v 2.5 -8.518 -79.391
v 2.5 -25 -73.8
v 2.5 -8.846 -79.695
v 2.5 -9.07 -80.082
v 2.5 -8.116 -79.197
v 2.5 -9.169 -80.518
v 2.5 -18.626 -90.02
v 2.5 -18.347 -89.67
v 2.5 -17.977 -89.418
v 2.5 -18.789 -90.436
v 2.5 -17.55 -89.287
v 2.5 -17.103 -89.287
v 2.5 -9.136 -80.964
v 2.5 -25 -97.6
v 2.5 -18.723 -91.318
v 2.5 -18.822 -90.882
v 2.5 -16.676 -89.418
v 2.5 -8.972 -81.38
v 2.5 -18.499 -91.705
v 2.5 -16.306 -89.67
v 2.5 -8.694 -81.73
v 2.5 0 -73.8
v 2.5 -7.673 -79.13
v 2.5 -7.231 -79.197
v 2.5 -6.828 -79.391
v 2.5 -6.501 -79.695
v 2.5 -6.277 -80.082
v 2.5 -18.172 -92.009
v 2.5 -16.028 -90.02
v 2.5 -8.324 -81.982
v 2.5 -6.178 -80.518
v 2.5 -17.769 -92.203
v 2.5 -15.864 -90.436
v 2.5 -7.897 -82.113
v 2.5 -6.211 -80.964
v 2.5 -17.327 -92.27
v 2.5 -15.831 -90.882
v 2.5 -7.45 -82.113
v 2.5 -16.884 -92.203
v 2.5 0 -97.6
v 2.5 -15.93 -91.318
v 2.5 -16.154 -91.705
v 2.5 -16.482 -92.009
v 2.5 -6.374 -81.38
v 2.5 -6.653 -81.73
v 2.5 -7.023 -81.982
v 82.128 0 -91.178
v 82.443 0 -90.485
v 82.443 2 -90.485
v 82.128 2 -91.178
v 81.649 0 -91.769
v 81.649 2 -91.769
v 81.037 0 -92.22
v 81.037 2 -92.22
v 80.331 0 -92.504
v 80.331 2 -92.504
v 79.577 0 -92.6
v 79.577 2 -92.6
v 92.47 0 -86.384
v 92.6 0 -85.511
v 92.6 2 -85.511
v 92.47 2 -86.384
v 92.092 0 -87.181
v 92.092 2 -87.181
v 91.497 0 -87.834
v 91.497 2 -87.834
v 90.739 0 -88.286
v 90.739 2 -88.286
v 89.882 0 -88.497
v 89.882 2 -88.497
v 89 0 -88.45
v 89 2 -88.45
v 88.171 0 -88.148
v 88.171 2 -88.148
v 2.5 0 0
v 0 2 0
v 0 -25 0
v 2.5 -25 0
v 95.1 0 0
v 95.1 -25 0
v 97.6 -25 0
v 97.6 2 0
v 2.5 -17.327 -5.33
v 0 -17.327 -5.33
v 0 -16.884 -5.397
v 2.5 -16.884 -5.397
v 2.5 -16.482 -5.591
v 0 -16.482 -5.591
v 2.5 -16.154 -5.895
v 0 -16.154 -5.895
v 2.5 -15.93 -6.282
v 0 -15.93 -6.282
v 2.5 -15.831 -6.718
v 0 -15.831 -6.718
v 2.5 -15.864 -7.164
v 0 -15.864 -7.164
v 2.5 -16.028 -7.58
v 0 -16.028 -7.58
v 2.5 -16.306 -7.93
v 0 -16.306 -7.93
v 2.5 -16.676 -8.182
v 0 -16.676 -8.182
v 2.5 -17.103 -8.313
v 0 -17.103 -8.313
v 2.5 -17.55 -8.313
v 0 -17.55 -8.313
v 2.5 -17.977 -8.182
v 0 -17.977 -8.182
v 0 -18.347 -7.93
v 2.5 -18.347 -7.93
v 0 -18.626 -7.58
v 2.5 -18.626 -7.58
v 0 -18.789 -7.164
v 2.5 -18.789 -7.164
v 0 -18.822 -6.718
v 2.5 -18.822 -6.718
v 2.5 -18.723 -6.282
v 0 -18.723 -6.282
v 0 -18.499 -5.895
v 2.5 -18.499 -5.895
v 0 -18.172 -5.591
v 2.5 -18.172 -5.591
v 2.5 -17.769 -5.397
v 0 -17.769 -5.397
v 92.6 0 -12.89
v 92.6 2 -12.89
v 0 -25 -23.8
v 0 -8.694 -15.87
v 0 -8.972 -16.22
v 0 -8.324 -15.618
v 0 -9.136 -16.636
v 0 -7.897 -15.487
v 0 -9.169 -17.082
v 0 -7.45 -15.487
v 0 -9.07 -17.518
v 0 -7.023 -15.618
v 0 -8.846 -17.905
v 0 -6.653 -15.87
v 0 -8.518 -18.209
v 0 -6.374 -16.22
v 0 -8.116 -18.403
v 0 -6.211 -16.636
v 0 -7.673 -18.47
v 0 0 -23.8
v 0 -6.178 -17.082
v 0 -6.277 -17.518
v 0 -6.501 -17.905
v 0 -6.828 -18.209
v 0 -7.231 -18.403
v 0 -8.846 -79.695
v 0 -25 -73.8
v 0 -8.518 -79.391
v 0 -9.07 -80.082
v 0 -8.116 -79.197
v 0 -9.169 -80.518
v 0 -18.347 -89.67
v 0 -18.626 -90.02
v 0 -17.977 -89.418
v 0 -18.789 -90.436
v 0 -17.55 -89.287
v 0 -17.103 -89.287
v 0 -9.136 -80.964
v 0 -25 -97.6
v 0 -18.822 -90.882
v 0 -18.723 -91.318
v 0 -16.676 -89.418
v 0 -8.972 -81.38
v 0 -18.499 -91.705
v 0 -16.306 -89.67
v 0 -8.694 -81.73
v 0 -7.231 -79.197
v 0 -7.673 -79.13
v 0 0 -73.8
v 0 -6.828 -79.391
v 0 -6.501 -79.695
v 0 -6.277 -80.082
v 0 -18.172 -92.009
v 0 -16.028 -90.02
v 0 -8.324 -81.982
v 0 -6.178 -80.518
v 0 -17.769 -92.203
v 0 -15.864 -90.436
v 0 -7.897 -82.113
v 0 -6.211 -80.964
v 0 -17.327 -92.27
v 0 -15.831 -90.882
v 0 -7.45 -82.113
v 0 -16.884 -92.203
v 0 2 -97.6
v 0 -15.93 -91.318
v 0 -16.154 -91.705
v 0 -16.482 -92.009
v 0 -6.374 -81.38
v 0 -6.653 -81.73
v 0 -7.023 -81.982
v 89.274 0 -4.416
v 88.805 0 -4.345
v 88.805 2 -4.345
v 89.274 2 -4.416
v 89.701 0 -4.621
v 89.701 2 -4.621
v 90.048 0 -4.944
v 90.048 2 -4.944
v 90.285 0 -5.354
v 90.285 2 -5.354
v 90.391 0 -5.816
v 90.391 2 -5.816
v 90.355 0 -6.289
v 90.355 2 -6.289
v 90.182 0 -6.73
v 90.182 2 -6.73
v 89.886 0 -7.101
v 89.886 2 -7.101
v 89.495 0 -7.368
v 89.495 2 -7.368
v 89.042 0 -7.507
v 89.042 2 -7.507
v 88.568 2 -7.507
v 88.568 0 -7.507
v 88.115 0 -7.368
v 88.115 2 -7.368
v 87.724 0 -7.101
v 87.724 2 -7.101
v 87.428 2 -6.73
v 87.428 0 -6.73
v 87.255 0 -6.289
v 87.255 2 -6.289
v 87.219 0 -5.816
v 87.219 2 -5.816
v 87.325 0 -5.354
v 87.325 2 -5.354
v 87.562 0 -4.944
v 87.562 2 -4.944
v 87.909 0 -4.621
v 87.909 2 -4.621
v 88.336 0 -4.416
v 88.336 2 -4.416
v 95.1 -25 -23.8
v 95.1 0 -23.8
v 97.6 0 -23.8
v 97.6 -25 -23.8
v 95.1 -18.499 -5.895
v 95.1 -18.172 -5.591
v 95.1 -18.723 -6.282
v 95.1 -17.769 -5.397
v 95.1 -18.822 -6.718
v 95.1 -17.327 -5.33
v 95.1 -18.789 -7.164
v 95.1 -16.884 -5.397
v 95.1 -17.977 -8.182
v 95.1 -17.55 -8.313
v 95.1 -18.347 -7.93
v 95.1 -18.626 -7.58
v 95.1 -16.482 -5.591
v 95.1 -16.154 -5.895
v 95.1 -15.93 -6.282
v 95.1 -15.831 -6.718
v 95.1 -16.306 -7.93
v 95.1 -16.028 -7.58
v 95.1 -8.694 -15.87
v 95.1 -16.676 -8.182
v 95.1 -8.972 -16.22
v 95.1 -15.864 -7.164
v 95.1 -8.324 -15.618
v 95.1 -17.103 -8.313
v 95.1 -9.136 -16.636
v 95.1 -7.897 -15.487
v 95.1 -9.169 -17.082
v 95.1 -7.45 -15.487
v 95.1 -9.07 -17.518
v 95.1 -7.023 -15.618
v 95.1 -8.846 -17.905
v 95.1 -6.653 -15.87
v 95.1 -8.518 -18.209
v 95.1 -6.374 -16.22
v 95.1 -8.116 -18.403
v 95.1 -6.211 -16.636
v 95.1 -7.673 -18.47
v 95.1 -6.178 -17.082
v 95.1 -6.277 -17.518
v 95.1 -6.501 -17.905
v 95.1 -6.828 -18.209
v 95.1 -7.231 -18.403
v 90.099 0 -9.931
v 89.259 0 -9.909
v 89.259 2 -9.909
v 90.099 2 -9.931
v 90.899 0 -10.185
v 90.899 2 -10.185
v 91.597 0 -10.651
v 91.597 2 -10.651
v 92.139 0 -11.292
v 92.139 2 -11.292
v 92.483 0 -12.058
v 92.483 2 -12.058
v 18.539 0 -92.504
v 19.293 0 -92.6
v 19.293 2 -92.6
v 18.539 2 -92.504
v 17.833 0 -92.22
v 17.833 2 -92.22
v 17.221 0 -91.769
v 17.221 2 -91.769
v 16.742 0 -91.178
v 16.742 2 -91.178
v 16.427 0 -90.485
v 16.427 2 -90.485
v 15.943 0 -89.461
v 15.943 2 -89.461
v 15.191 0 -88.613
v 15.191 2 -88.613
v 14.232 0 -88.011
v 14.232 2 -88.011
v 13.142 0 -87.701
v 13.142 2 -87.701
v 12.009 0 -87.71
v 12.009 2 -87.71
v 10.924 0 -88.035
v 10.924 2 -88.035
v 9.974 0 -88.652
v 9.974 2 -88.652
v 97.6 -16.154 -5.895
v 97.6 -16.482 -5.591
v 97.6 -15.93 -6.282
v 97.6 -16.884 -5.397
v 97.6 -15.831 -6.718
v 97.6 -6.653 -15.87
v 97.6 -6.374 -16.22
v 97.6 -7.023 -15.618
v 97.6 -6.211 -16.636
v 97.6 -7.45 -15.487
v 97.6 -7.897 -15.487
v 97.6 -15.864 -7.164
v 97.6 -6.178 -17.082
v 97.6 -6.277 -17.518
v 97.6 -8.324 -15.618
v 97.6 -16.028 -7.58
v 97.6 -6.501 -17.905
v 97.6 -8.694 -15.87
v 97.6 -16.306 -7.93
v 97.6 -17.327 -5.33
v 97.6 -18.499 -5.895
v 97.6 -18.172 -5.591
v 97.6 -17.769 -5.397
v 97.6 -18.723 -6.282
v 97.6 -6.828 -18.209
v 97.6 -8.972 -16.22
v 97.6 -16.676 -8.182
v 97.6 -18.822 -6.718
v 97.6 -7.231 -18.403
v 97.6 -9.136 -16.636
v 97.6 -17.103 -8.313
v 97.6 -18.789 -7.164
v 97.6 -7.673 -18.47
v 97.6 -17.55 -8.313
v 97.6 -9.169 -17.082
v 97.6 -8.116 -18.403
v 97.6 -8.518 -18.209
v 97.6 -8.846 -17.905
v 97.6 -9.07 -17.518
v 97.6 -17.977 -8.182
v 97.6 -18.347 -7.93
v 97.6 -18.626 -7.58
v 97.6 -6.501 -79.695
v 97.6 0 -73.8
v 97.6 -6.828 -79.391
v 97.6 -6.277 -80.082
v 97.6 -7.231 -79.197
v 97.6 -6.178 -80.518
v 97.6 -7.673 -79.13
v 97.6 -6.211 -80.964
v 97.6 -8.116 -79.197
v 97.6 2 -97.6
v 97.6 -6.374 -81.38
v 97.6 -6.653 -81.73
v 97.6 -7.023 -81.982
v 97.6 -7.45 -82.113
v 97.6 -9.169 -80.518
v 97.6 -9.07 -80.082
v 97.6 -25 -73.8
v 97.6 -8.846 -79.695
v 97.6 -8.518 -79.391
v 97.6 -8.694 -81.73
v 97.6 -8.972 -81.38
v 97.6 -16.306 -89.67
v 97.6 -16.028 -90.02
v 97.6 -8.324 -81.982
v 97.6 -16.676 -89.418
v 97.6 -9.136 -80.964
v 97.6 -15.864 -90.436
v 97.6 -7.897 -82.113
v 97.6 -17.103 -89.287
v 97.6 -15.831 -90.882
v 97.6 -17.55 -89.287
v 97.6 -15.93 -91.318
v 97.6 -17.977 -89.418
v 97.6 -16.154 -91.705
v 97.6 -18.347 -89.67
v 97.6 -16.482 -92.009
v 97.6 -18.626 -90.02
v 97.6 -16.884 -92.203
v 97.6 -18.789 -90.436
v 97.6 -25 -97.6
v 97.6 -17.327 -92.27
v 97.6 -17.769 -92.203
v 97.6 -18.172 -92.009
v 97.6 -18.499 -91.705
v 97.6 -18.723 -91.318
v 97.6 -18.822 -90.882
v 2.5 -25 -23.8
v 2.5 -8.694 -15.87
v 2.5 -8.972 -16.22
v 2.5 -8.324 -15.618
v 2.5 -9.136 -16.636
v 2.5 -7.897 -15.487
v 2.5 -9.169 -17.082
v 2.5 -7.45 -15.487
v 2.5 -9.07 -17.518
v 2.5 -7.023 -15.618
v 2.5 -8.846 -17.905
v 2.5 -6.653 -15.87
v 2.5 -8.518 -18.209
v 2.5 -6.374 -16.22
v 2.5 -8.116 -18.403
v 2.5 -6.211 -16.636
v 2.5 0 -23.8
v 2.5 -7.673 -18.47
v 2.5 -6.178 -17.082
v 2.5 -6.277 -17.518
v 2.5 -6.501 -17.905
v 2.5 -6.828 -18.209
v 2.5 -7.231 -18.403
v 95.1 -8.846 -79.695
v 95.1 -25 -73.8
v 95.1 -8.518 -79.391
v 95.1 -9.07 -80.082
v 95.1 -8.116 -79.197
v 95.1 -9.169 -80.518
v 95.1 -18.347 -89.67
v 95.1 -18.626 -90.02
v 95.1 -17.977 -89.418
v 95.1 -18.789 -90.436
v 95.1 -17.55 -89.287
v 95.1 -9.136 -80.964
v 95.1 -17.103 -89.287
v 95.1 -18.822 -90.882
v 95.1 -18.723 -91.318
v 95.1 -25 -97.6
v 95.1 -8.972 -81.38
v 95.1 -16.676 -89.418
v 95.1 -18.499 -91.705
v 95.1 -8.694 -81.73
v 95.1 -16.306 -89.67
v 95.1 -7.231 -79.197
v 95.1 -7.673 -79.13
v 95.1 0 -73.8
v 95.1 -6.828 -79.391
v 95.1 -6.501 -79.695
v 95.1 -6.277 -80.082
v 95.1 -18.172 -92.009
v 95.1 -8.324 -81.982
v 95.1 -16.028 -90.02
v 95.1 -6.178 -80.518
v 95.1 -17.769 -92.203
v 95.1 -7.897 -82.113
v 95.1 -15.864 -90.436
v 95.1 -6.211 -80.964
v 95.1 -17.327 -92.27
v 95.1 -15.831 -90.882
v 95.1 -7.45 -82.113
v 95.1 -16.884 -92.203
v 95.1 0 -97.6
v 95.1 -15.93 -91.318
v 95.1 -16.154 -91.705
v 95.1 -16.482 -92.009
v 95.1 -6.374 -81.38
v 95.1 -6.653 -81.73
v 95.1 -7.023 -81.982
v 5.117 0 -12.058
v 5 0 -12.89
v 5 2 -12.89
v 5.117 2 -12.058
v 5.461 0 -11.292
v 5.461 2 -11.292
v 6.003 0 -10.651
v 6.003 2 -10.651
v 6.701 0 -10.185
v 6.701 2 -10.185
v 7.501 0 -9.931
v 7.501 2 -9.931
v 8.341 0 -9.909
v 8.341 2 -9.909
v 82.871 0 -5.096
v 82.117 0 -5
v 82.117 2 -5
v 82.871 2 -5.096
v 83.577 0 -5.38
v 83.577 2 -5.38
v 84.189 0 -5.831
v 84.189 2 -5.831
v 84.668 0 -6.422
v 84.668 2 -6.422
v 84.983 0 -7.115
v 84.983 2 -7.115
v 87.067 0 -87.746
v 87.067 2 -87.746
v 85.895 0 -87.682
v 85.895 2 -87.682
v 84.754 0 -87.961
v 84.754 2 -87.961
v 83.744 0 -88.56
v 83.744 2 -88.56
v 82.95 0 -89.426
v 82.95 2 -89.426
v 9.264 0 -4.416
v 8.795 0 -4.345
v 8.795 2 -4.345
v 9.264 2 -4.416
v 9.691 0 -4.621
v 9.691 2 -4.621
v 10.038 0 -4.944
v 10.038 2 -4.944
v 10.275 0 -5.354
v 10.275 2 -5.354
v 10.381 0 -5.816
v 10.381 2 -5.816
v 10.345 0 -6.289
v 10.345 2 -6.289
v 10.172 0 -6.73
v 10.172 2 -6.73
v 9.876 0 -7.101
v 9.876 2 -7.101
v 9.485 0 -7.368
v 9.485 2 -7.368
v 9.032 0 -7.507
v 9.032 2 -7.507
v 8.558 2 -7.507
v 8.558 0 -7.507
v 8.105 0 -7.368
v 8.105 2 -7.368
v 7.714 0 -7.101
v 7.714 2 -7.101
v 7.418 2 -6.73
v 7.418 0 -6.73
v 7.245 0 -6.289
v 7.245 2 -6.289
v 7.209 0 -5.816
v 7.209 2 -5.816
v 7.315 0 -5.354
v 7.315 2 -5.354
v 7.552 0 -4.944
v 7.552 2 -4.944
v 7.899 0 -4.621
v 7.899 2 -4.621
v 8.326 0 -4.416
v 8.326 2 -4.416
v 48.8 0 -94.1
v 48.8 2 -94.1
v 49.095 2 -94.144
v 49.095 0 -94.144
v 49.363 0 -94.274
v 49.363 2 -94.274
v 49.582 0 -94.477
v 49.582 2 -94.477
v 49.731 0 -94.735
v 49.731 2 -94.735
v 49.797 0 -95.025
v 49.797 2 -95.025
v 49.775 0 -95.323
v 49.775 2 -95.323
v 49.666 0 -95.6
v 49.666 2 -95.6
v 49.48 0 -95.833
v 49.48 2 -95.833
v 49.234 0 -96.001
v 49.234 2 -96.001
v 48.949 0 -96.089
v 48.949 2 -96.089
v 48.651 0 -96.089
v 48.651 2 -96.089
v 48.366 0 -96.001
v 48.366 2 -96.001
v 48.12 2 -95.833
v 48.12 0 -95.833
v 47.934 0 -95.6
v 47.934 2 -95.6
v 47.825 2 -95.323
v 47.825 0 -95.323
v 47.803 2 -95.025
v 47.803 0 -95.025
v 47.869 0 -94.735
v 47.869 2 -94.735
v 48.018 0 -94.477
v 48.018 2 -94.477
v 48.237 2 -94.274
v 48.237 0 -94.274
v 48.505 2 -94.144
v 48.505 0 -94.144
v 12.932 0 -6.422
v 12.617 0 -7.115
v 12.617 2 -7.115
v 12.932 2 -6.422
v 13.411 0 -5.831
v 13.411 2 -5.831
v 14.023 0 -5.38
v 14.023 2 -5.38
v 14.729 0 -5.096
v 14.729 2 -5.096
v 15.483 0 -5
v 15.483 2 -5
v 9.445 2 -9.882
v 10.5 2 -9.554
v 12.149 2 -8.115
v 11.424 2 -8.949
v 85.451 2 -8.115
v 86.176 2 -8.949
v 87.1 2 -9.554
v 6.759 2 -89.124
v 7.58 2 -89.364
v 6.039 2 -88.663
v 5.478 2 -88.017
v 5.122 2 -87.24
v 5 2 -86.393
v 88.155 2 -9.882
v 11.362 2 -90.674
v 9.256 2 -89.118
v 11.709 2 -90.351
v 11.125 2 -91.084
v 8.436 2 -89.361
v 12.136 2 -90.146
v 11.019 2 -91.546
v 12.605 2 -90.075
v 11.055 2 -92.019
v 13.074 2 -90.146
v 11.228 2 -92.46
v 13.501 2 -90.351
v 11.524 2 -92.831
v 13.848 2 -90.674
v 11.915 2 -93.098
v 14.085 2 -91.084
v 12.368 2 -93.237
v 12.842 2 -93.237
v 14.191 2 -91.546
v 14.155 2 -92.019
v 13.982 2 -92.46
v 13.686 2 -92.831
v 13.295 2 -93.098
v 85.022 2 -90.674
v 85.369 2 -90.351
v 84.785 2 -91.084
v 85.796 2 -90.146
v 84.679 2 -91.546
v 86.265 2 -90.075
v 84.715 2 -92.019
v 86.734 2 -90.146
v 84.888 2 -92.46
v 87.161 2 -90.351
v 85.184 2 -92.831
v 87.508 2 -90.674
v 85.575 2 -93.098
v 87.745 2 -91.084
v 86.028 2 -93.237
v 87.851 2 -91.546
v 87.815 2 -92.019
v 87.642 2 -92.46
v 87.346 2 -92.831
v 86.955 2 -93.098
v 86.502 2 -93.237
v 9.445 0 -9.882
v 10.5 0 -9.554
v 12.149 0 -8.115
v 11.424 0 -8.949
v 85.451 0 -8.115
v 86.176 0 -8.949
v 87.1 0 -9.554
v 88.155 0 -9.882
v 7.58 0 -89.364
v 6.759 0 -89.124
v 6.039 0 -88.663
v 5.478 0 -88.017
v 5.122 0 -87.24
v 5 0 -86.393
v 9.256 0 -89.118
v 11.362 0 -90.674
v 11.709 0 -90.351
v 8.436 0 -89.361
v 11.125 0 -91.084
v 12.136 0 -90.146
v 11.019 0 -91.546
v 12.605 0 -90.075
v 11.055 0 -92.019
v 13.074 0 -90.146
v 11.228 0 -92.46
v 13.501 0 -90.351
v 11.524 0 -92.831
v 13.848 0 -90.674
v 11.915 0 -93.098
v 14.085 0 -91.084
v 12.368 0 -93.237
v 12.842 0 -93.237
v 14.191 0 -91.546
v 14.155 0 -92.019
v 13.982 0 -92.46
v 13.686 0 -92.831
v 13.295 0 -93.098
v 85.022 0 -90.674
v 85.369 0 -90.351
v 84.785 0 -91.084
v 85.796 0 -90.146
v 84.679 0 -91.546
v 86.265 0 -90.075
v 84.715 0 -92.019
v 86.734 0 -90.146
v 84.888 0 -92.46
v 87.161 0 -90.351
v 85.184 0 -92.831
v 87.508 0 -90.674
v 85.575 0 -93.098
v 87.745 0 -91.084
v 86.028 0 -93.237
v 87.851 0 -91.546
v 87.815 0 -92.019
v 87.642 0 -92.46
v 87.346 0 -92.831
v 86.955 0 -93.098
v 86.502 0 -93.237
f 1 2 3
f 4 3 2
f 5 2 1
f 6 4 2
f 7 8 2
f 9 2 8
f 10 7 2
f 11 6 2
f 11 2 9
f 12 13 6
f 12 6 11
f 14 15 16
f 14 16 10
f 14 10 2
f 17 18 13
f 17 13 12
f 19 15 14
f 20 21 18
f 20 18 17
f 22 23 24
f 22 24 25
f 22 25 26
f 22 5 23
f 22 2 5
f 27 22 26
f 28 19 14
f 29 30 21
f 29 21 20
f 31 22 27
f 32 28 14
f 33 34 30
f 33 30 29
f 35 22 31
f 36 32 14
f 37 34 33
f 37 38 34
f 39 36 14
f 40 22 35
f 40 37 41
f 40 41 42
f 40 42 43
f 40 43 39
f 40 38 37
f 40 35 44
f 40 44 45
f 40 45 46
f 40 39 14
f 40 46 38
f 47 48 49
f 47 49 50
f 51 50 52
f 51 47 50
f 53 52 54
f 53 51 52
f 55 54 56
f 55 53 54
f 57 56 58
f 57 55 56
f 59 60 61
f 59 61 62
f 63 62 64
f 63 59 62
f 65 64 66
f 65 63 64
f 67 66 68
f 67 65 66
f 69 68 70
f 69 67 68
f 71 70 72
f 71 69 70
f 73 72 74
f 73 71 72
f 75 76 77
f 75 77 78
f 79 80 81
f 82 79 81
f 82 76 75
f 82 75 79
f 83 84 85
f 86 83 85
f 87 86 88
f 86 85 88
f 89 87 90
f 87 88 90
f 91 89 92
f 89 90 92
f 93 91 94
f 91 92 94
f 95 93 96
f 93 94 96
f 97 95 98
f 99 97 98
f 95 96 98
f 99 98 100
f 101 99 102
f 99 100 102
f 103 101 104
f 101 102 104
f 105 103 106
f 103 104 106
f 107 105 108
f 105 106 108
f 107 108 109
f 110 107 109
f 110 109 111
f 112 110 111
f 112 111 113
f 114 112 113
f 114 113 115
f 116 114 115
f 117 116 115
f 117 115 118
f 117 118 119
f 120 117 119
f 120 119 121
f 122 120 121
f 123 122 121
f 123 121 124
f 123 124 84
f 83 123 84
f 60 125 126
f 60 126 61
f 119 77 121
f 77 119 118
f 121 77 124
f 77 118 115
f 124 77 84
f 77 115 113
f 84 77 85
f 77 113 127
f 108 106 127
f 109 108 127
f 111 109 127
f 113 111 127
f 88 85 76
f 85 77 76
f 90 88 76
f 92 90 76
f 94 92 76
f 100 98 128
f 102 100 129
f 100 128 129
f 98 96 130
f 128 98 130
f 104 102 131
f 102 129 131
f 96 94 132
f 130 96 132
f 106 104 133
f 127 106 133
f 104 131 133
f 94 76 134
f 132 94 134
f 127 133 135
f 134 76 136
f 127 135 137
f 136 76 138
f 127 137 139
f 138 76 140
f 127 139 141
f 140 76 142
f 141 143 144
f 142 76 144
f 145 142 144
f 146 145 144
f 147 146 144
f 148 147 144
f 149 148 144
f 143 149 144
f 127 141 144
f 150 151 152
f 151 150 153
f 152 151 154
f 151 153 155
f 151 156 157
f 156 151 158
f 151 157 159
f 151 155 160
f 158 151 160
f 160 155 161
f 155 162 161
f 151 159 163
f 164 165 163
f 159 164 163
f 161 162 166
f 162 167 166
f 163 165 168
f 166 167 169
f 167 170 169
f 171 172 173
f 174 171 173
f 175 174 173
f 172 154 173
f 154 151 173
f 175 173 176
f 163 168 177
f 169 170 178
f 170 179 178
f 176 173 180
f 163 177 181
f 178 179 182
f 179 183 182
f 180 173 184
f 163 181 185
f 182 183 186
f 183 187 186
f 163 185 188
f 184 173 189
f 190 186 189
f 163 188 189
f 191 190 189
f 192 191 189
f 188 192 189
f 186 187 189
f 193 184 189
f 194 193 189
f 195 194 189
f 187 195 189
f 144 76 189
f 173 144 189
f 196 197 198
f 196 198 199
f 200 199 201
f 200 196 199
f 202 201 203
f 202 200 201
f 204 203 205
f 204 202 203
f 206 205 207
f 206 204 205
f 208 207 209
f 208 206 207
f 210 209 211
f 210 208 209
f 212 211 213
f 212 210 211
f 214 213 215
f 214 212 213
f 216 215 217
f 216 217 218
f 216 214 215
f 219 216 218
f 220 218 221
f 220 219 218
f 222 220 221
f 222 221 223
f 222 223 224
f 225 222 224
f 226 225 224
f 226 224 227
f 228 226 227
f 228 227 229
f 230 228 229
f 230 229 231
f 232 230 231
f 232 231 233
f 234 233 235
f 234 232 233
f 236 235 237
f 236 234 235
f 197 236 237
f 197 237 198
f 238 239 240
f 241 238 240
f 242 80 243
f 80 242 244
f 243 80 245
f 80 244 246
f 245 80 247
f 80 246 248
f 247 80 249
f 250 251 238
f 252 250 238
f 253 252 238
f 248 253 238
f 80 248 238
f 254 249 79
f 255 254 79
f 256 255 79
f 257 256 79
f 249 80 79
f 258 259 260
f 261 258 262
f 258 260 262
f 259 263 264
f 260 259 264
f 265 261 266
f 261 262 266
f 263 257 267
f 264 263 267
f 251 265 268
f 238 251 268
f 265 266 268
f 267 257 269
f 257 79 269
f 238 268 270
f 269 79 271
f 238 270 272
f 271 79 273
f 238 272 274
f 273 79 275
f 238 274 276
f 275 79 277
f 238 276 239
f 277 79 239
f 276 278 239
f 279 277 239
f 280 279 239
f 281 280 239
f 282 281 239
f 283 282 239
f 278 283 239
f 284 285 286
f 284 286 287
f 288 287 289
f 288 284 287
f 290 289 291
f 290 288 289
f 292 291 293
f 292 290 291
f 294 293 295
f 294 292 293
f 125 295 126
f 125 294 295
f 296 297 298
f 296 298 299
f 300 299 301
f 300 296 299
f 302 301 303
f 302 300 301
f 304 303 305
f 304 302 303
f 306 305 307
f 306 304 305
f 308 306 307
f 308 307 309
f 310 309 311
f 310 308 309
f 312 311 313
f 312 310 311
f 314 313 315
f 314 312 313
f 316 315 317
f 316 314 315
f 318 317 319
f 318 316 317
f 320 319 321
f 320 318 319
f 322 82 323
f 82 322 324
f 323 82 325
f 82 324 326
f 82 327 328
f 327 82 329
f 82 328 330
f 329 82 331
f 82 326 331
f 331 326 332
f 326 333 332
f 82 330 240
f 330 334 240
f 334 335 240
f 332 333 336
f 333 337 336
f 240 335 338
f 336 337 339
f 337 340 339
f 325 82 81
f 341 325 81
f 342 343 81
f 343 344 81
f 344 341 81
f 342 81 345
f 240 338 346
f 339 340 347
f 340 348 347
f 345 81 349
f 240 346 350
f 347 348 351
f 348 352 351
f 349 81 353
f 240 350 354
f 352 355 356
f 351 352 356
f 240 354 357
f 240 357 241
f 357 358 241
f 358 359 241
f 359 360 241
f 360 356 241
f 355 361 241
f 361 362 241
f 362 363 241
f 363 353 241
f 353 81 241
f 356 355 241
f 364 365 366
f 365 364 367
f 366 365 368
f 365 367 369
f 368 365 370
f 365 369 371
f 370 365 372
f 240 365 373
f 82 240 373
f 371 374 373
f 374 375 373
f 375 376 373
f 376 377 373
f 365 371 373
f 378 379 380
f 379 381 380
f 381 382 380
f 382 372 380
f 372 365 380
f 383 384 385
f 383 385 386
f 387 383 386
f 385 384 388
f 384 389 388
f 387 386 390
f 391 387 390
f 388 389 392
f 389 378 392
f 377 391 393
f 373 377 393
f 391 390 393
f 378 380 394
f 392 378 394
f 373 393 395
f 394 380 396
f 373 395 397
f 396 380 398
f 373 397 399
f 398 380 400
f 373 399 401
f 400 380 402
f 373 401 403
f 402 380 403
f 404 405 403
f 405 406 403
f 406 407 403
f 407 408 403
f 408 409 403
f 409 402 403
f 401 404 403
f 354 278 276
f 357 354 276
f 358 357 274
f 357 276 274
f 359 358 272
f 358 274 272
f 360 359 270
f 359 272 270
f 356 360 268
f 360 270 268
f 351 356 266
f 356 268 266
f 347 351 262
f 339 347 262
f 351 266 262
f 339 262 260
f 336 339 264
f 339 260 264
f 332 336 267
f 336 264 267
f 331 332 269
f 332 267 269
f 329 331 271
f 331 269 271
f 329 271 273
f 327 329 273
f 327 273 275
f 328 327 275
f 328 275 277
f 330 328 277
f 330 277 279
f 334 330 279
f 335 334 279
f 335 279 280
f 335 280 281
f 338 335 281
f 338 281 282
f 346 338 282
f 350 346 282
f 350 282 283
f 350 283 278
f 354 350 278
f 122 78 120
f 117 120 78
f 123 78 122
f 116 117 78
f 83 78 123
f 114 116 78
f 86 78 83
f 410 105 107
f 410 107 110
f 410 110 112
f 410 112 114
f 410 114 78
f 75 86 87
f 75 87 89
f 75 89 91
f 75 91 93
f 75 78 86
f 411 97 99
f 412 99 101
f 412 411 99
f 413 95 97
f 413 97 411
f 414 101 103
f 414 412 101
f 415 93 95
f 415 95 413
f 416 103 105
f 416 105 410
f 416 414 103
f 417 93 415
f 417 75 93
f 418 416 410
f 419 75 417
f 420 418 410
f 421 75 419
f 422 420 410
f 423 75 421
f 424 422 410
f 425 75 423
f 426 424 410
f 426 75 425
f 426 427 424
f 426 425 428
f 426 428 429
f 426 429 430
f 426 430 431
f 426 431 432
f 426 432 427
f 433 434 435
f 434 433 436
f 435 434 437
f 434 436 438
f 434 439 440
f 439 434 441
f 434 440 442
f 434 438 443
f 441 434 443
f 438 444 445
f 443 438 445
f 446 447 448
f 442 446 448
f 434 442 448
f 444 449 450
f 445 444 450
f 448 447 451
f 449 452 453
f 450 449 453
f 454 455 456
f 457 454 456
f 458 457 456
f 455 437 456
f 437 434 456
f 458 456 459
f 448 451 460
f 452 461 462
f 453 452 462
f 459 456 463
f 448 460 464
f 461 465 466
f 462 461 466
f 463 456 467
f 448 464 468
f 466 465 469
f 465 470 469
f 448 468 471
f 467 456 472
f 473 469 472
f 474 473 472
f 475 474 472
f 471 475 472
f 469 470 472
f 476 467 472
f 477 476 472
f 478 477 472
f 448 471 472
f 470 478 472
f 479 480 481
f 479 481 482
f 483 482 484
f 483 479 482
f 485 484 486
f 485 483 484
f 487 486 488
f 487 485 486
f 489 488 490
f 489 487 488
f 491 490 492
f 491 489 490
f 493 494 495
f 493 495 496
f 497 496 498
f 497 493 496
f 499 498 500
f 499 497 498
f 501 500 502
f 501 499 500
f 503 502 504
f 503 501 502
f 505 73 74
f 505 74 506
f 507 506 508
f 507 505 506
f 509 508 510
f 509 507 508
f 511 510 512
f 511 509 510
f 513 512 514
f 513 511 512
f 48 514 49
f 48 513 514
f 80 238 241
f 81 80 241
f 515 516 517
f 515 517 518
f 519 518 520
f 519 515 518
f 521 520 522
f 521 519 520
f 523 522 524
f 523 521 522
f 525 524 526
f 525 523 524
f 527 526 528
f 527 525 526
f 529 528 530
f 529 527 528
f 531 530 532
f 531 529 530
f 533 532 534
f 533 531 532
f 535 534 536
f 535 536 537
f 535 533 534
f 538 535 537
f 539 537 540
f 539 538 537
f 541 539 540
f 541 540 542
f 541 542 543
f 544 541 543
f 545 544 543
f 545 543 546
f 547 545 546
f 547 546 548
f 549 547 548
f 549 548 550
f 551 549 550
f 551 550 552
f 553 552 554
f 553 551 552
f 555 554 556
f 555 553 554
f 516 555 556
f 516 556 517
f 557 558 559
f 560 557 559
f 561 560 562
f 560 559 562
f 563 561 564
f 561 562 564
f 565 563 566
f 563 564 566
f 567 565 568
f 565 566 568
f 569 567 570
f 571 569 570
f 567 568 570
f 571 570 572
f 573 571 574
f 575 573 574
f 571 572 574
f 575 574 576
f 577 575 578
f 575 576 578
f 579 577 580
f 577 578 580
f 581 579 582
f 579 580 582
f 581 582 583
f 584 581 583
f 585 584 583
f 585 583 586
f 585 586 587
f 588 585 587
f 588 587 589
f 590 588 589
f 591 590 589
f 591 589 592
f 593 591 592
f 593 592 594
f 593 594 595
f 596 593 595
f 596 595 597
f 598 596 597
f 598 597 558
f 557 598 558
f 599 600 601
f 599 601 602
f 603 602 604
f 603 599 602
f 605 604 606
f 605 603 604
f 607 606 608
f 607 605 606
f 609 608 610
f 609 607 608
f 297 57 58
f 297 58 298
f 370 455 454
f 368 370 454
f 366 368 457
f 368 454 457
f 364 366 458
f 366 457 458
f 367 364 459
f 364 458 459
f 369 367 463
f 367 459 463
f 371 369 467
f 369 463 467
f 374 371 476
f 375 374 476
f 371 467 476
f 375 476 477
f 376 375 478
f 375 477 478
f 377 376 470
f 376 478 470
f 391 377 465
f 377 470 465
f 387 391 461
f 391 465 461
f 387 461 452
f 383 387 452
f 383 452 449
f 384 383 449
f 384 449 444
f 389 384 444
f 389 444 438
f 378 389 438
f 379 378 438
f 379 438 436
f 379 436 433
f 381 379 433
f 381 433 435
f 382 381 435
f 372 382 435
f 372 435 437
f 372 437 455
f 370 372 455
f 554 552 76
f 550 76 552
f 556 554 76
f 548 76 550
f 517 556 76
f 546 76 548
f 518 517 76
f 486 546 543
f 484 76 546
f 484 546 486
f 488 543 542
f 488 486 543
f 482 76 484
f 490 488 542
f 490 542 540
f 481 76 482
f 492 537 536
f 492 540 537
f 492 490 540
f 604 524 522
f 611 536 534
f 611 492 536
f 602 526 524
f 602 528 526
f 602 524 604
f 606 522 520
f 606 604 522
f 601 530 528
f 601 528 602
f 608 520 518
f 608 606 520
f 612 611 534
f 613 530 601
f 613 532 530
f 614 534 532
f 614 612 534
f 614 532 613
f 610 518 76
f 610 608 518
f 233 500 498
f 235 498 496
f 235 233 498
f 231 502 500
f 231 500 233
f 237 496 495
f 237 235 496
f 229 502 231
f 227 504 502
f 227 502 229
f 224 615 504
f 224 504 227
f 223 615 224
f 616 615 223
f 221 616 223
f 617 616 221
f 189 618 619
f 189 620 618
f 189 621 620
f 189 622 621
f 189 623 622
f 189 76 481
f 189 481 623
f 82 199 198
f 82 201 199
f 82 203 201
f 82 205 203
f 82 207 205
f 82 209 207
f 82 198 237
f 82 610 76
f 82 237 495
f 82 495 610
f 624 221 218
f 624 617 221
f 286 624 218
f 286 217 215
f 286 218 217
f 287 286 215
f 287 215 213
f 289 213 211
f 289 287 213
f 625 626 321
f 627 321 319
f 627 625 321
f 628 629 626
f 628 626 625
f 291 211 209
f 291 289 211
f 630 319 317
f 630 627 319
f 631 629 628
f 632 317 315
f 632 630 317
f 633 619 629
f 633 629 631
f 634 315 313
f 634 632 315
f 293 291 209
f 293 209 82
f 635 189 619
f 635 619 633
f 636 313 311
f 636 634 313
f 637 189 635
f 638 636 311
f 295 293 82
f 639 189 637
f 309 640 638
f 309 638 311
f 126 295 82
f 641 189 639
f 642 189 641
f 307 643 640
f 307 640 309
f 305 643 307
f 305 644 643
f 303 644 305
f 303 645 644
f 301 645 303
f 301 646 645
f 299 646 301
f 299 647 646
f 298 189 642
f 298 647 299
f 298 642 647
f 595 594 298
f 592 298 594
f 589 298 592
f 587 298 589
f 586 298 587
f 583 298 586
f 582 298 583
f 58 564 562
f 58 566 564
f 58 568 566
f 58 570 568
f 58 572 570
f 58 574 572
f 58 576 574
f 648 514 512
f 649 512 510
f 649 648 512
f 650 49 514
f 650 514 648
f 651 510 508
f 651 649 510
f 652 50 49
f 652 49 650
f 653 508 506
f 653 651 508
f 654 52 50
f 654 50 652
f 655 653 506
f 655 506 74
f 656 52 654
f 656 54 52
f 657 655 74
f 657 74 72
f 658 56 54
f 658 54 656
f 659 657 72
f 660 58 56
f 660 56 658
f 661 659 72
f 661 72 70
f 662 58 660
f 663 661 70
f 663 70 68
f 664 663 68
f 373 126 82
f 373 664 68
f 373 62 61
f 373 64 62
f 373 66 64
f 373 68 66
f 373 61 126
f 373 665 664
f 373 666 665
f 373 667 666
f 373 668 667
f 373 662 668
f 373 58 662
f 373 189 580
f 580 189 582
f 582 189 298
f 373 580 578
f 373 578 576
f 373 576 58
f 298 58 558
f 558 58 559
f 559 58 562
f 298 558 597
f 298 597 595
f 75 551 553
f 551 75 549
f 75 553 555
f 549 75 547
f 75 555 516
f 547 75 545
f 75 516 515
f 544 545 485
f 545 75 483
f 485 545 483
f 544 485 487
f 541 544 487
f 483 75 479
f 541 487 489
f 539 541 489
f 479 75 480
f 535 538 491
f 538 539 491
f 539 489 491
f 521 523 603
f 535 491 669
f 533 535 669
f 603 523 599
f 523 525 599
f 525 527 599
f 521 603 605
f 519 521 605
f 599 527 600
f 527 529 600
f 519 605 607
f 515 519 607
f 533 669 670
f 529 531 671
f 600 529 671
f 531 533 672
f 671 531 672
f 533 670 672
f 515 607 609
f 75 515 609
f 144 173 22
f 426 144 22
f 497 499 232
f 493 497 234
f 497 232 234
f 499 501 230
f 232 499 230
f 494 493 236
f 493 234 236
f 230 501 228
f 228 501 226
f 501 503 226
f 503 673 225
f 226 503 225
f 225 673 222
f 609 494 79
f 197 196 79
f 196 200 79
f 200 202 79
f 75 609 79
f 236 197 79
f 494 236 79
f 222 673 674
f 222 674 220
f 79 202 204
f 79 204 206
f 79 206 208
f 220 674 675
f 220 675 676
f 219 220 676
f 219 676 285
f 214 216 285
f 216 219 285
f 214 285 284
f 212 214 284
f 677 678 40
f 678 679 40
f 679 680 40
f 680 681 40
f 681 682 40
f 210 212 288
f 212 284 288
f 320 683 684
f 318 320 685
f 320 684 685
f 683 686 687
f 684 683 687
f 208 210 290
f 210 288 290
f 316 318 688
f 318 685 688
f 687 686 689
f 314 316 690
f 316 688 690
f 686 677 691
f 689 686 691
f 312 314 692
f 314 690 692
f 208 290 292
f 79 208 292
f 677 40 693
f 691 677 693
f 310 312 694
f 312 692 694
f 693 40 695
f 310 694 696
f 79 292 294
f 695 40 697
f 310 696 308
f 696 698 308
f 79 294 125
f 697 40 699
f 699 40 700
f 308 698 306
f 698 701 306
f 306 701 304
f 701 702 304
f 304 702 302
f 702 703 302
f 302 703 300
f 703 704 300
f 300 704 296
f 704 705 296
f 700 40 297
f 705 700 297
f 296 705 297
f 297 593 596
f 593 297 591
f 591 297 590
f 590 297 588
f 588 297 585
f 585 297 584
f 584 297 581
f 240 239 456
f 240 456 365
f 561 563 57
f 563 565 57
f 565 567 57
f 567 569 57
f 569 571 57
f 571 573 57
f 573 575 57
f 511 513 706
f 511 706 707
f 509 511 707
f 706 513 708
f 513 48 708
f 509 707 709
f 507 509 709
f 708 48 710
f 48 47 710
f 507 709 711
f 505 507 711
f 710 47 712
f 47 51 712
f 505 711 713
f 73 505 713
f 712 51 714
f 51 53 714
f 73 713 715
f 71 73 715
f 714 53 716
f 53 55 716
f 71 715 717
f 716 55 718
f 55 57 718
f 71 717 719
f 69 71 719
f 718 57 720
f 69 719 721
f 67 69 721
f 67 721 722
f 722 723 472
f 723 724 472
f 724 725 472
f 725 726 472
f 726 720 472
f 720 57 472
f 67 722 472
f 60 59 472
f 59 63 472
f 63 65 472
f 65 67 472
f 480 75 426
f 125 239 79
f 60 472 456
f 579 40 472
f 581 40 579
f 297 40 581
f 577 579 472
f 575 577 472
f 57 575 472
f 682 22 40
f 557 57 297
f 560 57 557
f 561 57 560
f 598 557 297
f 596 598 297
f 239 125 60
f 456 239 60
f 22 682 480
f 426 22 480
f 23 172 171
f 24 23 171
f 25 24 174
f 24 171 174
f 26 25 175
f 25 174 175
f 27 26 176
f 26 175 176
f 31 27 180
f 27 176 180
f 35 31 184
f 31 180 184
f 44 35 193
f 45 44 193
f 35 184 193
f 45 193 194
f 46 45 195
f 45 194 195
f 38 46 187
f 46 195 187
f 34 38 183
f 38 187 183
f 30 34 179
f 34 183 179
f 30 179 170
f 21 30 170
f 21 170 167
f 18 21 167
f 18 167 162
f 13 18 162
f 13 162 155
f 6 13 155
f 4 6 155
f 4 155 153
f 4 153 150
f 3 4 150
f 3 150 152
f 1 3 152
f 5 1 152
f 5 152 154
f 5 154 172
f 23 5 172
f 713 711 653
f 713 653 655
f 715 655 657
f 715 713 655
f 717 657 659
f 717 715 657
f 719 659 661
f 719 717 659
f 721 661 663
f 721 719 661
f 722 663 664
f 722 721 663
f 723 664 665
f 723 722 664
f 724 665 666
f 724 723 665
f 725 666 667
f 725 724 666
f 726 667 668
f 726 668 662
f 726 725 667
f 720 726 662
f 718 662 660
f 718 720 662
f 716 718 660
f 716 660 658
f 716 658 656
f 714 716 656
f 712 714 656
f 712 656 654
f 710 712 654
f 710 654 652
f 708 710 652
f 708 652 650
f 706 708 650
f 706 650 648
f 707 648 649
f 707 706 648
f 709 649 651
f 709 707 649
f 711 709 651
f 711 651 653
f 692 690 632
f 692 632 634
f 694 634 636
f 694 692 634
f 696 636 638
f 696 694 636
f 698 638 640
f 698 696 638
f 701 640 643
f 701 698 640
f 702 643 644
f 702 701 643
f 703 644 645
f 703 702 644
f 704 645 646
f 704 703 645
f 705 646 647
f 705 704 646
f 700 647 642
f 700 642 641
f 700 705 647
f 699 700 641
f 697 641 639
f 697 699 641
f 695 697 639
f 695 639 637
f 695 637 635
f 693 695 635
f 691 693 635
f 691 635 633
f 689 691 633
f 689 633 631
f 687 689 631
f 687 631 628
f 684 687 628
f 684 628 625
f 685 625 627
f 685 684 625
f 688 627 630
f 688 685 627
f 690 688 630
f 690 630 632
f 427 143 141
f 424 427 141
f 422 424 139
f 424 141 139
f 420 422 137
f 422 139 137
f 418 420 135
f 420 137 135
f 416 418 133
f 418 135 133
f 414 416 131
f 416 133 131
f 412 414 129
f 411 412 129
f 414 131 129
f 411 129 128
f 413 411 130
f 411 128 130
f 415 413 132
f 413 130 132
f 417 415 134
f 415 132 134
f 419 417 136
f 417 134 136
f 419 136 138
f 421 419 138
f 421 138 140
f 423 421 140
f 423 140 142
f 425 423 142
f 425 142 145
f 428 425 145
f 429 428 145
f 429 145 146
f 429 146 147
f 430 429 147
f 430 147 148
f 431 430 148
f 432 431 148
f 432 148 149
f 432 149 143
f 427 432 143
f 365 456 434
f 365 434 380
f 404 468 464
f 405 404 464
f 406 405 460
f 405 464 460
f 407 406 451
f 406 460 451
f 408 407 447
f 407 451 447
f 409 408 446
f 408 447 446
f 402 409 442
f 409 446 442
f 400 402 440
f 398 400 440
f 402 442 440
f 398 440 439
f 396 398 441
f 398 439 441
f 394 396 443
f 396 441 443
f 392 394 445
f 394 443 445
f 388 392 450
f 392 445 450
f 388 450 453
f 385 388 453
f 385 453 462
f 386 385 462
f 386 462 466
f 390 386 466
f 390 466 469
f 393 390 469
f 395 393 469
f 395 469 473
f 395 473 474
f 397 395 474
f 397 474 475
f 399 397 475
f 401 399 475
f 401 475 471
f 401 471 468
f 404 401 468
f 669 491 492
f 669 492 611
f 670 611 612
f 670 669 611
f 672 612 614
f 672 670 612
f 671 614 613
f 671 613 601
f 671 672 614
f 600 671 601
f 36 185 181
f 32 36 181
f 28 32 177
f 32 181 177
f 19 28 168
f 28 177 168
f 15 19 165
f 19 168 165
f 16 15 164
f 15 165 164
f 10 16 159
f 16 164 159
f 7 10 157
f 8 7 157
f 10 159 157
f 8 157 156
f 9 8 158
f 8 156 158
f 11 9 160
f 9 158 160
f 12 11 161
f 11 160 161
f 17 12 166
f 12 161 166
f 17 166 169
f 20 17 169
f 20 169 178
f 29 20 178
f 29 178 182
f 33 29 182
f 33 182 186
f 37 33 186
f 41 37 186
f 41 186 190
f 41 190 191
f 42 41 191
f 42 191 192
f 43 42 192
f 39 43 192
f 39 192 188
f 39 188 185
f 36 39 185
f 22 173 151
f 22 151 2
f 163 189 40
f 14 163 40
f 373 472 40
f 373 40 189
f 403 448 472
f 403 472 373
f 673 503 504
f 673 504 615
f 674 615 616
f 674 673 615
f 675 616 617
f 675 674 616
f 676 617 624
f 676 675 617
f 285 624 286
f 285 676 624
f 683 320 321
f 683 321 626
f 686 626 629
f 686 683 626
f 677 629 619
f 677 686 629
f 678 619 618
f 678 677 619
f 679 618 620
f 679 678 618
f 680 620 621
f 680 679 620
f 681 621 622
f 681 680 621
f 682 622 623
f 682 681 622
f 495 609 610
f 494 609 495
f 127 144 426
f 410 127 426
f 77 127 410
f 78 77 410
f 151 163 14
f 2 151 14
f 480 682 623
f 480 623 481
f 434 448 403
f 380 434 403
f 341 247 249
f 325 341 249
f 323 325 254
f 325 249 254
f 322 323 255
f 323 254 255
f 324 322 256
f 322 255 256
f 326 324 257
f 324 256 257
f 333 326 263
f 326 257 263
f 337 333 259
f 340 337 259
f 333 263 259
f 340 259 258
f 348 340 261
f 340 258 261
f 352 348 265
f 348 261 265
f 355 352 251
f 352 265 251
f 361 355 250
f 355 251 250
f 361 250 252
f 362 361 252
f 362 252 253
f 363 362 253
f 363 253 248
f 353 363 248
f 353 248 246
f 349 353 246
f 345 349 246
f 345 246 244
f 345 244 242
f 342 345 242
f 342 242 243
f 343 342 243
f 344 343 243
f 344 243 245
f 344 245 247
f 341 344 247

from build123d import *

# Parameters (mm, degrees)
SKETCH_1_W          = 97.6
SKETCH_1_H          = 97.6
SKETCH_1_R          = 1.59
EXTRUDE_1_DEPTH     = 2
SKETCH_2_R          = 1
CUT_EXTRUDE_1_DEPTH = 139.04173282
EXTRUDE_START       = -2
SKETCH_7_W          = 2.5
SKETCH_7_H          = 23.8
EXTRUDE_2_DEPTH     = 25
SKETCH_8_R          = 1.5
CUT_EXTRUDE_2_DEPTH = 141.273019501


with BuildPart() as part:
    # Эскиз1 → Бобышка-Вытянуть1 (new body)
    with BuildSketch(Plane(origin=(0, 0, 0), x_dir=(1, 0, 0), z_dir=(0, 1, 0))):
        with Locations((48.8, 48.8)):
            Rectangle(SKETCH_1_W, SKETCH_1_H)
        with Locations(Location((86.265001451, 91.665000306, 0), (0, 0, 270))):
            Circle(SKETCH_1_R, mode=Mode.SUBTRACT)
        with Locations(Location((88.805001451, 5.935000306, 0), (0, 0, 270))):
            Circle(SKETCH_1_R, mode=Mode.SUBTRACT)
        with Locations(Location((8.795001451, 5.935000306, 0), (0, 0, 270))):
            Circle(SKETCH_1_R, mode=Mode.SUBTRACT)
        with Locations(Location((12.605001451, 91.665000306, 0), (0, 0, 270))):
            Circle(SKETCH_1_R, mode=Mode.SUBTRACT)
        with BuildLine():
            Line((79.576520776, 92.6), (19.293482126, 92.6))
            ThreePointArc((19.293482126, 92.6), (17.512330868, 92.014021582), (16.426990408, 90.485000131))
            ThreePointArc((16.426990408, 90.485000131), (13.697675352, 87.817135476), (9.97357205, 88.652430089))
            ThreePointArc((9.97357205, 88.652430089), (6.759176917, 89.124368033), (5, 86.393002427))
            Line((5, 86.393002427), (5, 12.889708976))
            ThreePointArc((5, 12.889708976), (6.002770009, 10.651166513), (8.340714907, 9.909119546))
            ThreePointArc((8.340714907, 9.909119546), (10.982952752, 9.28356255), (12.616990516, 7.115000131))
            ThreePointArc((12.616990516, 7.115000131), (13.702330946, 5.5859785), (15.483482314, 5))
            Line((15.483482314, 5), (82.116520587, 5))
            ThreePointArc((82.116520587, 5), (83.897671955, 5.5859785), (84.983012386, 7.115000131))
            ThreePointArc((84.983012386, 7.115000131), (86.617049451, 9.283562094), (89.259286336, 9.909119736))
            ThreePointArc((89.259286336, 9.909119736), (91.597230458, 10.651167261), (92.6, 12.889709308))
            Line((92.6, 12.889709308), (92.6, 85.510507258))
            ThreePointArc((92.6, 85.510507258), (91.13495028, 88.088089), (88.170714907, 88.148147136))
            ThreePointArc((88.170714907, 88.148147136), (84.753959284, 87.961386993), (82.443012494, 90.485000131))
            ThreePointArc((82.443012494, 90.485000131), (81.357672034, 92.014021582), (79.576520776, 92.6))
        make_face(mode=Mode.SUBTRACT)
    extrude(amount=EXTRUDE_1_DEPTH)

    # Эскиз2 → Вырез-Вытянуть1 (cut, through all)
    with BuildSketch(Plane(origin=(0, 2, 0), x_dir=(1, 0, 0), z_dir=(0, 1, 0))):
        with Locations(Location((48.8, 95.1, 0), (0, 0, 270))):
            Circle(SKETCH_2_R)
    extrude(amount=-CUT_EXTRUDE_1_DEPTH, mode=Mode.SUBTRACT)

    # Эскиз7 → Бобышка-Вытянуть2 (add)
    with BuildSketch(Plane(origin=(0, 2, 0), x_dir=(1, 0, 0), z_dir=(0, 1, 0)).offset(EXTRUDE_START)):
        with Locations((1.25, 11.9)):
            Rectangle(SKETCH_7_W, SKETCH_7_H)
        with Locations((1.25, 85.7)):
            Rectangle(SKETCH_7_W, SKETCH_7_H)
        with Locations((96.35, 85.7)):
            Rectangle(SKETCH_7_W, SKETCH_7_H)
        with Locations((96.35, 11.9)):
            Rectangle(SKETCH_7_W, SKETCH_7_H)
    extrude(amount=-EXTRUDE_2_DEPTH)

    # Эскиз8 → Вырез-Вытянуть2 (cut, through all)
    with BuildSketch(Plane.ZY):
        with Locations((-80.630070031, -7.67342667)):
            Circle(SKETCH_8_R)
        with Locations(Location((-90.769929969, -17.32657333, 0), (0, 0, 180))):
            Circle(SKETCH_8_R)
        with Locations((-6.830070031, -17.32657333)):
            Circle(SKETCH_8_R)
        with Locations(Location((-16.969929969, -7.67342667, 0), (0, 0, 180))):
            Circle(SKETCH_8_R)
    extrude(amount=-CUT_EXTRUDE_2_DEPTH, mode=Mode.SUBTRACT)


solid = part.part
